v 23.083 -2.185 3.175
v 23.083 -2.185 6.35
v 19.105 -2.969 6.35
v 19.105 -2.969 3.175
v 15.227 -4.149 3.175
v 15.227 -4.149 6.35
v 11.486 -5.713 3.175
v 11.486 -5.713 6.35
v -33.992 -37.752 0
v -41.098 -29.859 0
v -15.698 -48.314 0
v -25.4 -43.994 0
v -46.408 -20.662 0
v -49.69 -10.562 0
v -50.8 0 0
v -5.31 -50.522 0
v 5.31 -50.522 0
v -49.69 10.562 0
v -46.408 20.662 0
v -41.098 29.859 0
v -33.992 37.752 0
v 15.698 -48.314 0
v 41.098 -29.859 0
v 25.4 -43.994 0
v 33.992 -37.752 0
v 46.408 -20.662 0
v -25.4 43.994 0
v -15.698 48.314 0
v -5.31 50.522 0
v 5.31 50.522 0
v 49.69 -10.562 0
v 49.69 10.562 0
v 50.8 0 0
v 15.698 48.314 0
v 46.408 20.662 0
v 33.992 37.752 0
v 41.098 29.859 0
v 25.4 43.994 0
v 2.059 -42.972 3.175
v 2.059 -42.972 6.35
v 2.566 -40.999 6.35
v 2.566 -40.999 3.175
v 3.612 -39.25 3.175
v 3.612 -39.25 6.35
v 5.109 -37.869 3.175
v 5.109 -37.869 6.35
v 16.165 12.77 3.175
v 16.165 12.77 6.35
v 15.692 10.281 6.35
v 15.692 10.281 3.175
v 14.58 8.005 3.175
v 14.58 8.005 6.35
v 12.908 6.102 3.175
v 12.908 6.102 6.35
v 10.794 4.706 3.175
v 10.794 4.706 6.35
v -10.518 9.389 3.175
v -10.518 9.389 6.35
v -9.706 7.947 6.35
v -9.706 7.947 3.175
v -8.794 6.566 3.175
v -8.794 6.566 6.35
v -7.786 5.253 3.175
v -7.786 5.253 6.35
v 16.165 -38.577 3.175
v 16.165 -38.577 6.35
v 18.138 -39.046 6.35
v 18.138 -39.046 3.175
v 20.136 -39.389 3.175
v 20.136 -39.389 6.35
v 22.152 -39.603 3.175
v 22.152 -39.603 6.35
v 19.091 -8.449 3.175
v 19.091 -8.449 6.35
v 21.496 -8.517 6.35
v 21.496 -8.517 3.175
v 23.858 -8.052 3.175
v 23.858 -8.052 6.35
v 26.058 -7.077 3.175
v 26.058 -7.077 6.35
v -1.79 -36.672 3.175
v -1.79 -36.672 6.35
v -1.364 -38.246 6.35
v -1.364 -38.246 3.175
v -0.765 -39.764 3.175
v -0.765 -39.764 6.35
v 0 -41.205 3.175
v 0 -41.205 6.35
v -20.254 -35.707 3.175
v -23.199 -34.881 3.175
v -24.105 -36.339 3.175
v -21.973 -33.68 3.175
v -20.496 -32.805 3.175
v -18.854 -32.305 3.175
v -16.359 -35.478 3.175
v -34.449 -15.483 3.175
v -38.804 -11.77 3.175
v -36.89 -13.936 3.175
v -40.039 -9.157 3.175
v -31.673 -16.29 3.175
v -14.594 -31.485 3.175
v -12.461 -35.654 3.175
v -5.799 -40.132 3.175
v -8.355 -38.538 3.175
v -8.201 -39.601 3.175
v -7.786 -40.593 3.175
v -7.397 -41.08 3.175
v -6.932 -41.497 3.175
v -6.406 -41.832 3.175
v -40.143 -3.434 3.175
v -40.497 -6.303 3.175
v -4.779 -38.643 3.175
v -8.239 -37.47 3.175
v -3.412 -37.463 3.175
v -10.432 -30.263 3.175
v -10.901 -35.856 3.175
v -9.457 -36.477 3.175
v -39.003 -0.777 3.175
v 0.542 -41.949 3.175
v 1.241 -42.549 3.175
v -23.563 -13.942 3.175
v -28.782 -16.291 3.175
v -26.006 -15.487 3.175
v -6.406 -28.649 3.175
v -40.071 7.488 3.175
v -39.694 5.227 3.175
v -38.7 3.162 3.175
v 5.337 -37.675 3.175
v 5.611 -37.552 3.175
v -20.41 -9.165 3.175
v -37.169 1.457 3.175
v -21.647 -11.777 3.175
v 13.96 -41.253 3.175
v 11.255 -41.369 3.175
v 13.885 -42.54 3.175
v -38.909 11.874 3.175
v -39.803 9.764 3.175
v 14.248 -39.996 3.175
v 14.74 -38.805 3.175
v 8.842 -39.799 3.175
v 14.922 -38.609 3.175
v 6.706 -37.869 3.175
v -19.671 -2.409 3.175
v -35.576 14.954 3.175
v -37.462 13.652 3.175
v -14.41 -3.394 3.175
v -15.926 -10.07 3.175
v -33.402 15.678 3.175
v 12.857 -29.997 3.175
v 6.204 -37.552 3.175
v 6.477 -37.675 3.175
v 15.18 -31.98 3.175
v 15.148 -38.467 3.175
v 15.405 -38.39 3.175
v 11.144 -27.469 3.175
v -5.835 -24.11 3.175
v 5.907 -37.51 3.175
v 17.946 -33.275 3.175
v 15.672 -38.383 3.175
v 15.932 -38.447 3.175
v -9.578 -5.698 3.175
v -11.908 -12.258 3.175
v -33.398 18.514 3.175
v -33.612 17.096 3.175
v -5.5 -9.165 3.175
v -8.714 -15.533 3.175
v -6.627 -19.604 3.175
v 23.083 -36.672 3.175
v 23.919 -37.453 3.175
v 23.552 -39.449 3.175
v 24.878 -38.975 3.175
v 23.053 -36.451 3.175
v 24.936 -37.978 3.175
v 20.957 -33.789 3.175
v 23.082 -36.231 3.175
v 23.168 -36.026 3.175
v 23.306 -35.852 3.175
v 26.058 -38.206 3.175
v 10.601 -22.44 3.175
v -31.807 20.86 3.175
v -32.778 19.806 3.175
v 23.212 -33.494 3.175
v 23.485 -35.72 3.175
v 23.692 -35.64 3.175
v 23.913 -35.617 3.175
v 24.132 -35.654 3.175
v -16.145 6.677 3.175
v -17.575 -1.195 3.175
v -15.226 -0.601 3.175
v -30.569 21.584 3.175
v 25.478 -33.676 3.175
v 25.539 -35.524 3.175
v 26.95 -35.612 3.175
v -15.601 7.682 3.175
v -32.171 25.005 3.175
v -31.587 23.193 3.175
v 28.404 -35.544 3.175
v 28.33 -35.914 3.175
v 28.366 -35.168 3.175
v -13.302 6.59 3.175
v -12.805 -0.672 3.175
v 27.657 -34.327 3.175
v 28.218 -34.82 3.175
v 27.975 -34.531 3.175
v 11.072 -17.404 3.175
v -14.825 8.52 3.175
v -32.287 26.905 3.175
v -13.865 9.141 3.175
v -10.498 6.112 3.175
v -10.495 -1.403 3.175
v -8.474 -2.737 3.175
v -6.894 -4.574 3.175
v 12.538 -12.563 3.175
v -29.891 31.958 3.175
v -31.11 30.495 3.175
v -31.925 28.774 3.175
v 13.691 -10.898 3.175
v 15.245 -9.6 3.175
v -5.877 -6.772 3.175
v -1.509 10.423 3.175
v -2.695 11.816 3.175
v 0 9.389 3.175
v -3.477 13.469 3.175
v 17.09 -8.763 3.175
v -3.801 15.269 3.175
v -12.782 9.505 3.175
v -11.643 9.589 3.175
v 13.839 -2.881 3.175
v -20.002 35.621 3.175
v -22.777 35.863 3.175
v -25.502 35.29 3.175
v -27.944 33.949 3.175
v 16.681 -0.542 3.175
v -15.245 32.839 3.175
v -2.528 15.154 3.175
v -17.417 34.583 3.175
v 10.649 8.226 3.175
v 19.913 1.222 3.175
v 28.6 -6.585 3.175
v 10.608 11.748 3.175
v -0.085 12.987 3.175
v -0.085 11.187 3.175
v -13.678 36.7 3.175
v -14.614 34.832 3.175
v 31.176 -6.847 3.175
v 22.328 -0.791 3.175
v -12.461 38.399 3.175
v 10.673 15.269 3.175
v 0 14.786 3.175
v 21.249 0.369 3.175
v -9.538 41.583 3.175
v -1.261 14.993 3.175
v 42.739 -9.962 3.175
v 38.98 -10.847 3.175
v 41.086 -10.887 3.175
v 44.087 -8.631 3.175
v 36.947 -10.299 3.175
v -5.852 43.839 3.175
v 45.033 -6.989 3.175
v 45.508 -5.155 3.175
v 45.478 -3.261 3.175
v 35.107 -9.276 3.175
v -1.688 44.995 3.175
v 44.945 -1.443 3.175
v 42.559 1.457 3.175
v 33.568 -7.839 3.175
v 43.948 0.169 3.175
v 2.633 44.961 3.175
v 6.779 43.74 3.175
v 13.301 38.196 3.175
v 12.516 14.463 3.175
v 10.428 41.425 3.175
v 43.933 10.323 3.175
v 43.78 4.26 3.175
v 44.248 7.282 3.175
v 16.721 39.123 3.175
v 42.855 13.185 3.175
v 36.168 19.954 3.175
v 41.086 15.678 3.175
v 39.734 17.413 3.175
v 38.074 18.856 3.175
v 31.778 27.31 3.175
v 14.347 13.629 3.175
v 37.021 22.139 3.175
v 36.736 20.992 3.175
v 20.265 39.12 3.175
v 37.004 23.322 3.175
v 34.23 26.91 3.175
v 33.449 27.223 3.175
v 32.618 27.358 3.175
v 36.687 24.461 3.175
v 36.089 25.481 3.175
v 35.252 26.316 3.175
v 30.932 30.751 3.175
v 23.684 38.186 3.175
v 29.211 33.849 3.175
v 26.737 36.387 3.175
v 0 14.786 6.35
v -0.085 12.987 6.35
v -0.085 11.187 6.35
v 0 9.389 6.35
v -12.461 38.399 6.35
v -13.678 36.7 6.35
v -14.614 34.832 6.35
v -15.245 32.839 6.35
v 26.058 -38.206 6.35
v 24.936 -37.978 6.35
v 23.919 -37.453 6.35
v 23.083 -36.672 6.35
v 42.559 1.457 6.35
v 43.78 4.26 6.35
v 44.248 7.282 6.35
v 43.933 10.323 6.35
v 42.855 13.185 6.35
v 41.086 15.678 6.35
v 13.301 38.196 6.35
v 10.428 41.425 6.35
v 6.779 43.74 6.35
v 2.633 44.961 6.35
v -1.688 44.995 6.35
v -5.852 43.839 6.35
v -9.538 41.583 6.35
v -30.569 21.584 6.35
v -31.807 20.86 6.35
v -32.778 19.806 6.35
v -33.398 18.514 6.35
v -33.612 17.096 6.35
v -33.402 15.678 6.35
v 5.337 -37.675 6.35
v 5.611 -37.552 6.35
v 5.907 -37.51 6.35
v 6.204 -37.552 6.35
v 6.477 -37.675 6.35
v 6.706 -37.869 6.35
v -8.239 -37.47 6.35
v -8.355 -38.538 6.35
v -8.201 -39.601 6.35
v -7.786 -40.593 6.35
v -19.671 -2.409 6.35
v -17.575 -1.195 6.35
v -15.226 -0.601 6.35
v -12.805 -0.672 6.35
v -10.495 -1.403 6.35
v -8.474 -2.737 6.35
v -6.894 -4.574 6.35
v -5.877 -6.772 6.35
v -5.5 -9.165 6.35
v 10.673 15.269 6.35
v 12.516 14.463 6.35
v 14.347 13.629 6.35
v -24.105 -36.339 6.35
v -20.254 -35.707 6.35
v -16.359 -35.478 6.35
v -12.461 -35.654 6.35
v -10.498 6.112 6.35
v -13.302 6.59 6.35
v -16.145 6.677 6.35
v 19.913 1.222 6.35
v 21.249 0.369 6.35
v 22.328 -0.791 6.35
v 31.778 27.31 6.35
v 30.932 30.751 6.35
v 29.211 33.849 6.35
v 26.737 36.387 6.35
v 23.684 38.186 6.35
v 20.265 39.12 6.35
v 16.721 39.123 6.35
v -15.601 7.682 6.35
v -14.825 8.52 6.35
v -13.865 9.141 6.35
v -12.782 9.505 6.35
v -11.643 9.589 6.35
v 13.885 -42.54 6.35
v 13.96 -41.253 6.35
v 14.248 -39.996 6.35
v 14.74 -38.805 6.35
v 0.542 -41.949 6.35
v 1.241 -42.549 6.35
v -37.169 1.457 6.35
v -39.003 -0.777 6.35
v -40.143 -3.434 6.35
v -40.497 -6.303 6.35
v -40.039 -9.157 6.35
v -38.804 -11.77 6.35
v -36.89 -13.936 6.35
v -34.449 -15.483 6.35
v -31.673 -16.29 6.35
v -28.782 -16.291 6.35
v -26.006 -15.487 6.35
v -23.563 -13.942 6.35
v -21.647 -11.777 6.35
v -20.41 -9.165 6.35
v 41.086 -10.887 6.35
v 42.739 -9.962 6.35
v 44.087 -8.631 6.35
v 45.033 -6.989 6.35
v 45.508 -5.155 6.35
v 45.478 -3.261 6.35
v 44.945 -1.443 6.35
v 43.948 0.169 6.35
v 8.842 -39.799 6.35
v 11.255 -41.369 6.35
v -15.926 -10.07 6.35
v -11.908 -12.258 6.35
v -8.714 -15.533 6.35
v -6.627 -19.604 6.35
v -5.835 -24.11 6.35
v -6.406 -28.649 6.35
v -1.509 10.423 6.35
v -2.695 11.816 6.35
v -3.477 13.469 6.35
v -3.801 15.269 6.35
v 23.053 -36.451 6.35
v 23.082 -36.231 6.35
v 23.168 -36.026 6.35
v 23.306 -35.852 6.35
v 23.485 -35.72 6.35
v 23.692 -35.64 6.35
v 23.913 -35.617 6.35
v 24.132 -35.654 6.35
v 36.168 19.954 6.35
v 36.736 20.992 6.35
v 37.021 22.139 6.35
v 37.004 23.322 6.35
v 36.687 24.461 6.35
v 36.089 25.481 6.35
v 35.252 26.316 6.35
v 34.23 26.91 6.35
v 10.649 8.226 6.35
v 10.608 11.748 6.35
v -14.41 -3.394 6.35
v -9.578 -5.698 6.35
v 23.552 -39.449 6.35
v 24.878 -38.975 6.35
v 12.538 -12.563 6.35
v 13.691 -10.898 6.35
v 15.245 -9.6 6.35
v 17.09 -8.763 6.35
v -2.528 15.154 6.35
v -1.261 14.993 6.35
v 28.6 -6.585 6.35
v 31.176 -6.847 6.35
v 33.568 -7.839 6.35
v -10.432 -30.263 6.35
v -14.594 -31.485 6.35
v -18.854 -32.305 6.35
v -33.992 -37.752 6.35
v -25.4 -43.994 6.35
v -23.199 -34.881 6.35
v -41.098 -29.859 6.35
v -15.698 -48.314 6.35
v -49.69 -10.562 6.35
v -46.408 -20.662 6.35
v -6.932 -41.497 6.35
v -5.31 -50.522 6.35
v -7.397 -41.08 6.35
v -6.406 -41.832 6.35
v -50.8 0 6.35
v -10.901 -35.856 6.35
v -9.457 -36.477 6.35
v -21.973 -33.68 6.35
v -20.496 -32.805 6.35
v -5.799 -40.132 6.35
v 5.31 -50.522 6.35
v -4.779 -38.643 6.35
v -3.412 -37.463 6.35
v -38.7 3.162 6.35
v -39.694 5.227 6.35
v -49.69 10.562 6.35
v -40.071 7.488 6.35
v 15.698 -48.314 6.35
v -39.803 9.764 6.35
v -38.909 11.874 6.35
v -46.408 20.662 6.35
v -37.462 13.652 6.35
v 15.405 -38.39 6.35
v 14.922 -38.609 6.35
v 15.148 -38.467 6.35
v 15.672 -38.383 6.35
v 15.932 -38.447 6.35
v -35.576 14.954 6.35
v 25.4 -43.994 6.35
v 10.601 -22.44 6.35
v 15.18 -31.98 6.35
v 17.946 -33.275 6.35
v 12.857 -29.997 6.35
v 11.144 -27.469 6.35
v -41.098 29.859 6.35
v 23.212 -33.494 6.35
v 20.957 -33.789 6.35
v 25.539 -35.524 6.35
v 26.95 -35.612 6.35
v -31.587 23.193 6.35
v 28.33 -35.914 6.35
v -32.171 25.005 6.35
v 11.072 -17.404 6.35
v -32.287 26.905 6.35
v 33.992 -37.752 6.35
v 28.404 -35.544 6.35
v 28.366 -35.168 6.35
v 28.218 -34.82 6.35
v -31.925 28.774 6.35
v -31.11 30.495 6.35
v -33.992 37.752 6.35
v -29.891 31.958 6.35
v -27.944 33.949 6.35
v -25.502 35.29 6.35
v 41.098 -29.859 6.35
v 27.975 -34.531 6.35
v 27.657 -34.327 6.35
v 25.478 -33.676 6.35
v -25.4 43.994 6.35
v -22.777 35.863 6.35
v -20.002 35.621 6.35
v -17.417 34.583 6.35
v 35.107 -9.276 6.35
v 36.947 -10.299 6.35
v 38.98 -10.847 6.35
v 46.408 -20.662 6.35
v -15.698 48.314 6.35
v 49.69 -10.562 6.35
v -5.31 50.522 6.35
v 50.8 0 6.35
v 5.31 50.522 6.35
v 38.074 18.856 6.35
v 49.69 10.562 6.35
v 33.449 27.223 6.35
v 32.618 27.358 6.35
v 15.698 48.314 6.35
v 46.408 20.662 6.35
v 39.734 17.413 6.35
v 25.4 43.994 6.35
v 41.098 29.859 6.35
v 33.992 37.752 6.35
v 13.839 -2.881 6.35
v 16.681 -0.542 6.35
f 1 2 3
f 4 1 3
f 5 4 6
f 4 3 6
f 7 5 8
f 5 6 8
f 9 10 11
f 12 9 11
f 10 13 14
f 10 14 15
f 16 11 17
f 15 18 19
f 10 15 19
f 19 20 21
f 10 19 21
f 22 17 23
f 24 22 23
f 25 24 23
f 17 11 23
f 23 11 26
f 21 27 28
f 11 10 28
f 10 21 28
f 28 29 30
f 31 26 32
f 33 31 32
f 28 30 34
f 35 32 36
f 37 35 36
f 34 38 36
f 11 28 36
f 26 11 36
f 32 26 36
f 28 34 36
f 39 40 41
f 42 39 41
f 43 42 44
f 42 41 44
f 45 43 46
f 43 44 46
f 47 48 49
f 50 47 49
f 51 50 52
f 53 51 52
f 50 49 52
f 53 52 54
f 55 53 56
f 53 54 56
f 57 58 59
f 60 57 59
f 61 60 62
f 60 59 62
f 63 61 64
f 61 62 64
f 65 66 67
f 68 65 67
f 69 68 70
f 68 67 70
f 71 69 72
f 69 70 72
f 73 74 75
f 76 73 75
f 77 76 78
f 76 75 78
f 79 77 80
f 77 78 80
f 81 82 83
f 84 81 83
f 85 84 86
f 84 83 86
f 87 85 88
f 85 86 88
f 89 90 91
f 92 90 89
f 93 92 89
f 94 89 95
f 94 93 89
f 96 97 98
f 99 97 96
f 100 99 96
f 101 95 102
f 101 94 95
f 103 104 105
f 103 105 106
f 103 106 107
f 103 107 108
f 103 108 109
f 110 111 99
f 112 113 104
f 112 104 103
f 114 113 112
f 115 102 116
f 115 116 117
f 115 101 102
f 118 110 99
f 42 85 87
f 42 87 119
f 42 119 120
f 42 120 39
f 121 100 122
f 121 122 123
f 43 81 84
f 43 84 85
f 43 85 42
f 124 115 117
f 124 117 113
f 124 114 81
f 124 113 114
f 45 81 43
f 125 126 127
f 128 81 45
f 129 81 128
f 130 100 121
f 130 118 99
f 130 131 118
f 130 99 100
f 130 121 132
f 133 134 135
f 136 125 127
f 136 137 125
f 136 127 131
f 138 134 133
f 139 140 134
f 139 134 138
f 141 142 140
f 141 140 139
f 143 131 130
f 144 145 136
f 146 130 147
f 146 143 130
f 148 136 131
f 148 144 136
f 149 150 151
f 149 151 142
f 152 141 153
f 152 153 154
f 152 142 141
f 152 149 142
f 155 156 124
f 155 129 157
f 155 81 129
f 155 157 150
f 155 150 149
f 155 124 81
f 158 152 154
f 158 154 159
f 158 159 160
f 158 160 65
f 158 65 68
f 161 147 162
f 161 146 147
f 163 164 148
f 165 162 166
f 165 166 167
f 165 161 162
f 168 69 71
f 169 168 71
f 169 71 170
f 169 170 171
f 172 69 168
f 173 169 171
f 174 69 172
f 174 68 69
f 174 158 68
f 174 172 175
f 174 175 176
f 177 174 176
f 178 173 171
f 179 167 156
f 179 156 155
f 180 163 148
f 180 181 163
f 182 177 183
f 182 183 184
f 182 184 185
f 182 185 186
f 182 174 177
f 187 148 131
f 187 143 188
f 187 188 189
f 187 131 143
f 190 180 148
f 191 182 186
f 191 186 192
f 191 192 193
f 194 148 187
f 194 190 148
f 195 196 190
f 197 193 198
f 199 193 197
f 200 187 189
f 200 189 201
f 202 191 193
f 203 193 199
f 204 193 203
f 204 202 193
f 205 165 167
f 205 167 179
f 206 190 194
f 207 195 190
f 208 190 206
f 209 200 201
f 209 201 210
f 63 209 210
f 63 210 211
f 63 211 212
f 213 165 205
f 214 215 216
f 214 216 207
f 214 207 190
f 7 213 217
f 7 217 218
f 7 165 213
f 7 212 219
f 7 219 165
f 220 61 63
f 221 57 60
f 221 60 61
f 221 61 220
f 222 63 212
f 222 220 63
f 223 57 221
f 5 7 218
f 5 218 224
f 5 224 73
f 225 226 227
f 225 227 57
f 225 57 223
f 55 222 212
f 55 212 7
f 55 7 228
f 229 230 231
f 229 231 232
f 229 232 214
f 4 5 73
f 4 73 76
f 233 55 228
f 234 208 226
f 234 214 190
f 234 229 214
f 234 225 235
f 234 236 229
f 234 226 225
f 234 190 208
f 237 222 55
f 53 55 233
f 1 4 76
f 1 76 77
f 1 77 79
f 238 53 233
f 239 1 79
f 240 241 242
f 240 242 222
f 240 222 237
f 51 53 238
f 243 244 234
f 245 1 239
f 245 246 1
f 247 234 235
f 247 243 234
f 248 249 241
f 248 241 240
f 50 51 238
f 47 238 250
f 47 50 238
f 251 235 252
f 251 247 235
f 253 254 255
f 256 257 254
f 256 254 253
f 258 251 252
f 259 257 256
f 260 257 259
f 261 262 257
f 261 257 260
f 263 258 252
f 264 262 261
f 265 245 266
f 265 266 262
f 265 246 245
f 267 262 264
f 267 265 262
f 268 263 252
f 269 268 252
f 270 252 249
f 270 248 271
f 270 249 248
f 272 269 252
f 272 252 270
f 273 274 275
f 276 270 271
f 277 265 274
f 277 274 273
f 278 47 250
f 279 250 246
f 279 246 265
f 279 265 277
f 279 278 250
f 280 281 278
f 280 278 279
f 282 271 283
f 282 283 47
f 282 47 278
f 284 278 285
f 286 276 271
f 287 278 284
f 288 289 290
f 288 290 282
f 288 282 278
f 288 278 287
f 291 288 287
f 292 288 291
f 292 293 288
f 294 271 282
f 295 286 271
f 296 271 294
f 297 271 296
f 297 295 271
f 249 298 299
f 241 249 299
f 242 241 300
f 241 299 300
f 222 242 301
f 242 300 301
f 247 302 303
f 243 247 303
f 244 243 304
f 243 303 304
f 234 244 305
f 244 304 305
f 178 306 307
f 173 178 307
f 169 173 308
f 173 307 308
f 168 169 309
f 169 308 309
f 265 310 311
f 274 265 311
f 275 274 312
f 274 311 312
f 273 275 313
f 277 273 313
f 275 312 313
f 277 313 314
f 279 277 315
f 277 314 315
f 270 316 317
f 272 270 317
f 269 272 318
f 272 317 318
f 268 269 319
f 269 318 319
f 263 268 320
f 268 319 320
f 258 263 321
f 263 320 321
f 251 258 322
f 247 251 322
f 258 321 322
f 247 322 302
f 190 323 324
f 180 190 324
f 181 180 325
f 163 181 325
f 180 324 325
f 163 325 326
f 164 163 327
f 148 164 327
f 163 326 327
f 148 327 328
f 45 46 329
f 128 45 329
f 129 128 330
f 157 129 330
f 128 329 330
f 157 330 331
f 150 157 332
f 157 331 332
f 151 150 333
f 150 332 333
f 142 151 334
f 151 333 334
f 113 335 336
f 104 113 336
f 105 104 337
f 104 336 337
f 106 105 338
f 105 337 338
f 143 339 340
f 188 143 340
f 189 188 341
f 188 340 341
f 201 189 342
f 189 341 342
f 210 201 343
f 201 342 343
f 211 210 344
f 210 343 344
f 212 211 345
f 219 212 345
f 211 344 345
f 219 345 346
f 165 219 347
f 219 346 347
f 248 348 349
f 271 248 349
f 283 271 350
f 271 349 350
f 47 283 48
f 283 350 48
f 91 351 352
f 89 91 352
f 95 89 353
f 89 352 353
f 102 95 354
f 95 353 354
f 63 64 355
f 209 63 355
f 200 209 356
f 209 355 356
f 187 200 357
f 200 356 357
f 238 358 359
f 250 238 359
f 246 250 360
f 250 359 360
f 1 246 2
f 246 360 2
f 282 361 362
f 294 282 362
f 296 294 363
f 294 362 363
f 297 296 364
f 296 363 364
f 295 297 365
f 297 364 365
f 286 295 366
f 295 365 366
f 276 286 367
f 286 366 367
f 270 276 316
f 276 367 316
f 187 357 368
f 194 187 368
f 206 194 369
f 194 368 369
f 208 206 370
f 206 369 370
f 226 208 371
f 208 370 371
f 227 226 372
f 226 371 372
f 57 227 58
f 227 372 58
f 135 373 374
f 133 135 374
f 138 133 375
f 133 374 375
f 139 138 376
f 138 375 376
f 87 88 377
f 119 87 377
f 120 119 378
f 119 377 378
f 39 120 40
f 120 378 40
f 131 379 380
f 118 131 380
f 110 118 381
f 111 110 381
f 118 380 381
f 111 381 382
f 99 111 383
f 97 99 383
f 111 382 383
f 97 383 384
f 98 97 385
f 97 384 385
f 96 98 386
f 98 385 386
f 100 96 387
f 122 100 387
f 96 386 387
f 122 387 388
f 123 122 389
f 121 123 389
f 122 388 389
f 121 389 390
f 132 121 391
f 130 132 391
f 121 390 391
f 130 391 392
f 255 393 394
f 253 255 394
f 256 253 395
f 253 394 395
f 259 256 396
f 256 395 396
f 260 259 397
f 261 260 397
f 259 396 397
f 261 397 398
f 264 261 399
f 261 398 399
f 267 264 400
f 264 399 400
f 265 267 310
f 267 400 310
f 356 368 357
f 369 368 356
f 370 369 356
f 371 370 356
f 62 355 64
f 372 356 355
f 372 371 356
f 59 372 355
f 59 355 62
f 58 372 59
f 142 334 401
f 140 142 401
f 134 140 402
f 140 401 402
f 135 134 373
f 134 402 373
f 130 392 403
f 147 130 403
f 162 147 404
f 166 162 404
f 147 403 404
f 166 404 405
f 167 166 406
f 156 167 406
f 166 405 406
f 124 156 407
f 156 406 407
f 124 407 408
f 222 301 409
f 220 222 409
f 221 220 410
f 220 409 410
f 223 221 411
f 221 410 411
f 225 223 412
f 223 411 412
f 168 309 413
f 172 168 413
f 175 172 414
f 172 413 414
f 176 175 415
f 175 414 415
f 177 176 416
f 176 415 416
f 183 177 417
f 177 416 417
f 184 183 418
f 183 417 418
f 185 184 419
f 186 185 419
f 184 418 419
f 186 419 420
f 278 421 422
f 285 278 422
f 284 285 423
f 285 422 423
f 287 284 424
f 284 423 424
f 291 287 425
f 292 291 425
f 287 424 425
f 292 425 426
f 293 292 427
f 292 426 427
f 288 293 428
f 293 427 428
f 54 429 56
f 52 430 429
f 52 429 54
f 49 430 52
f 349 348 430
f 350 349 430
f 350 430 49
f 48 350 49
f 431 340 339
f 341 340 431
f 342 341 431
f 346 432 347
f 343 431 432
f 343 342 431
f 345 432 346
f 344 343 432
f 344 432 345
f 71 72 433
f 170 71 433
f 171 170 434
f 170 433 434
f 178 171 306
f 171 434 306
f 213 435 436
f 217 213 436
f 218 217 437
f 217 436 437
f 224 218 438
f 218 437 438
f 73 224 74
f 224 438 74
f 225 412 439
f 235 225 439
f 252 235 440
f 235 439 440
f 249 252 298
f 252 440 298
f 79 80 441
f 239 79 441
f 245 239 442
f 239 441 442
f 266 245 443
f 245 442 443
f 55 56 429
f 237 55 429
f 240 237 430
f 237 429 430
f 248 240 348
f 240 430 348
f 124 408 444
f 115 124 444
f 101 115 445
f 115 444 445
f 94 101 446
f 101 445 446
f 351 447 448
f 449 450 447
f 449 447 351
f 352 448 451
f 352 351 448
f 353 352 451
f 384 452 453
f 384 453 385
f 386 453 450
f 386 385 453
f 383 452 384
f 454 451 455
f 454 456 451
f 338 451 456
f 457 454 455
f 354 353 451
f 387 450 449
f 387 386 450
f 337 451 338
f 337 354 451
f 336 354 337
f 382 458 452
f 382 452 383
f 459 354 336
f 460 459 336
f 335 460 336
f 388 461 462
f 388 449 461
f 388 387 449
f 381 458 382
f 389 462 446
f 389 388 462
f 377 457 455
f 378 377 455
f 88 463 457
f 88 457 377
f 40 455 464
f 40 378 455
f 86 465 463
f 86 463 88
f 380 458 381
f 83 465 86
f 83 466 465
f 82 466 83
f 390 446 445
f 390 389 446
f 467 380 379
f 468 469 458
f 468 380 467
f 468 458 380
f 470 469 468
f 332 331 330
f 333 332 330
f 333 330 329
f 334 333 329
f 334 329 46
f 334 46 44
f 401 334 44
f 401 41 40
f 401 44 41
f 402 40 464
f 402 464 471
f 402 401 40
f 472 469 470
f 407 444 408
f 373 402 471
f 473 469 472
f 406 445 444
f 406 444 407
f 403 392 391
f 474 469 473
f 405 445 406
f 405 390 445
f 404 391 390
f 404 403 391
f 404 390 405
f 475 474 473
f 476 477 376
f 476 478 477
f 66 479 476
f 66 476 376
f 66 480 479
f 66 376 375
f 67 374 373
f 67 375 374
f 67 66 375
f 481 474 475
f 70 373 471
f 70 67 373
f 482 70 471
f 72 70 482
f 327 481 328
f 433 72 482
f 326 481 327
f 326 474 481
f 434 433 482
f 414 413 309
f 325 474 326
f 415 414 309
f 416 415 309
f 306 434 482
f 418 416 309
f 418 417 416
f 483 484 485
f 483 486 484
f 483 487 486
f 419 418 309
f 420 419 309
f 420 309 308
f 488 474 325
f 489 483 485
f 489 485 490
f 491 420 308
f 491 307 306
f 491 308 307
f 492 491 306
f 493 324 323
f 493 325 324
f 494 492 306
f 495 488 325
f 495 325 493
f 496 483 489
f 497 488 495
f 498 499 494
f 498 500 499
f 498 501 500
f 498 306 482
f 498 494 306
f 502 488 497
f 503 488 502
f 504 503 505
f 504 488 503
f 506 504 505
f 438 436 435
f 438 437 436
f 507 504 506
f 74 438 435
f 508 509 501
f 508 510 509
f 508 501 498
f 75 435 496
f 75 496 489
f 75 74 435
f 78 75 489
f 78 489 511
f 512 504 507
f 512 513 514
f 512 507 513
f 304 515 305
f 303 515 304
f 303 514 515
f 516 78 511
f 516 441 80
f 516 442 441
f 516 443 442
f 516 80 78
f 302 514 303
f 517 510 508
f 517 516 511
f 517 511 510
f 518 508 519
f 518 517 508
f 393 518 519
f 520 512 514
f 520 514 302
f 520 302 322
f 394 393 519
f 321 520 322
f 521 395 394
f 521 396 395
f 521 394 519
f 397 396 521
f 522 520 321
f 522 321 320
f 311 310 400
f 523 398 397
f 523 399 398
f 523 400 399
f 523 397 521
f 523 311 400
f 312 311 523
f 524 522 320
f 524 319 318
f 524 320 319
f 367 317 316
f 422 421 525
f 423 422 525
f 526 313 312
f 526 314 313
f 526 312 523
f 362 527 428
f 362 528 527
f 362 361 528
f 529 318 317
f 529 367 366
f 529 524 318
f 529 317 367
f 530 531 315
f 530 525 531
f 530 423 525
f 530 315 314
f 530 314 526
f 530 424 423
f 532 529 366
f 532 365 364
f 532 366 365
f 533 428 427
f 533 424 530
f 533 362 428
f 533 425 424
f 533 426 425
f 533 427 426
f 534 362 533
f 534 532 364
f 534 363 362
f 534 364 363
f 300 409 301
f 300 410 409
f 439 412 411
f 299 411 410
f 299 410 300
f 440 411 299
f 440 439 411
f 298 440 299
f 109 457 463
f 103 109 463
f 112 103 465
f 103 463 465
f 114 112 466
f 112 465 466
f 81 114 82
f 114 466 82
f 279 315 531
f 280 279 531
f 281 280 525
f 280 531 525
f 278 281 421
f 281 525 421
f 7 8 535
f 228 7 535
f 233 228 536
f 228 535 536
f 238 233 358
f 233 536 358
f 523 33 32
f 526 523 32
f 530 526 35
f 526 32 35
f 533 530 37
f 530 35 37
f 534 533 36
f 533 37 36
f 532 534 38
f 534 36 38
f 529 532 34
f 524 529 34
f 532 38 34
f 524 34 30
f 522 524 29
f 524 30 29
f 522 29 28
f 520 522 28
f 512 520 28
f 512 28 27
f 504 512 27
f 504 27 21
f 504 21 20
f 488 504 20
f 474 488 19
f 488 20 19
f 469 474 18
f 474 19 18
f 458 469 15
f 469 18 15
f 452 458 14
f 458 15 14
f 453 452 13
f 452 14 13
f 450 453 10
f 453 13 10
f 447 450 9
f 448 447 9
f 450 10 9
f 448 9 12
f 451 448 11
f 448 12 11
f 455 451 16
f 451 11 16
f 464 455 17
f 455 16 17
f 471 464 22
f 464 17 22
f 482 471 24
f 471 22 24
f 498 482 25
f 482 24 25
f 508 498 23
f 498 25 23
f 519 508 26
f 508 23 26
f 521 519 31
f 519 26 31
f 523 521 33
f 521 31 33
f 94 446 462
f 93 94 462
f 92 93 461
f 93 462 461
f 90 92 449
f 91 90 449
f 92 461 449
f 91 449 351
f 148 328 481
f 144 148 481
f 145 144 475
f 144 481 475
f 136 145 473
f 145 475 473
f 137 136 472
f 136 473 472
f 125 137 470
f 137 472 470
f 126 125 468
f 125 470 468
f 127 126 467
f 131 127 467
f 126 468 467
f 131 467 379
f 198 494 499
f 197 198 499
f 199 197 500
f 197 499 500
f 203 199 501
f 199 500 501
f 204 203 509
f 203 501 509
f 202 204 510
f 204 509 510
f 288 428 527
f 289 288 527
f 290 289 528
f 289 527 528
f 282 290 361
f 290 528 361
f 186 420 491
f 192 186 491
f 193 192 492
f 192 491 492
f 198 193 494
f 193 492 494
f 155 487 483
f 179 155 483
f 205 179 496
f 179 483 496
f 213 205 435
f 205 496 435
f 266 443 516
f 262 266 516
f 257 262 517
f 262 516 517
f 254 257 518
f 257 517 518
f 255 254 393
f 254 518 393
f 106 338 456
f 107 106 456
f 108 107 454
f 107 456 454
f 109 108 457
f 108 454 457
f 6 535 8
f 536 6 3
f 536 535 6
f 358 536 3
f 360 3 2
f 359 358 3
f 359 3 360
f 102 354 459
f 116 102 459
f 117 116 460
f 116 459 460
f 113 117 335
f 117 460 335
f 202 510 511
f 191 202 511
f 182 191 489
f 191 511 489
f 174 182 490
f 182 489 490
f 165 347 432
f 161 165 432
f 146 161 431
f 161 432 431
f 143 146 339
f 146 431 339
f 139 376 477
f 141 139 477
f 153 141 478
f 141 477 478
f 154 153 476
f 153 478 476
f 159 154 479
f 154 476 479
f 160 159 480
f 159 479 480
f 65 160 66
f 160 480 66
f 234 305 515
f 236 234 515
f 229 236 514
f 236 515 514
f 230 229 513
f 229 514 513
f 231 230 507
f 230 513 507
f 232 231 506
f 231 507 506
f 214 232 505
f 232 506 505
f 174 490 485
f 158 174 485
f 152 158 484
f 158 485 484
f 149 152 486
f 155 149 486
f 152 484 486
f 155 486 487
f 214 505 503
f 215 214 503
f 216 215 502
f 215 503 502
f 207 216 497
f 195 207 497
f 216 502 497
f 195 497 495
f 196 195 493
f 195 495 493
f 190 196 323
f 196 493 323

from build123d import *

# Parameters (mm, degrees)
F0_R     = 50.8
F1_DEPTH = 6.35
F3_DEPTH = 3.175


with BuildPart() as f1:
    # F0 (on Top) → F1 (new body)
    with BuildSketch(Plane.XY):
        Circle(F0_R)
    extrude(amount=F1_DEPTH)

    # F2 (on face) → F3 (cut)
    with BuildSketch(Plane.XY.offset(6.35)):
        with BuildLine():
            ThreePointArc((-20.409899, -9.165186), (-8.713511, -15.533016), (-6.405892, -28.649023))
            ThreePointArc((-6.405892, -28.649023), (-12.498571, -30.92391), (-18.853704, -32.30527))
            ThreePointArc((-18.853704, -32.30527), (-21.972675, -33.680035), (-24.105206, -36.339033))
            ThreePointArc((-24.105206, -36.339033), (-18.309615, -35.54218), (-12.460569, -35.654053))
            ThreePointArc((-12.460569, -35.654053), (-10.157818, -36.115918), (-8.238821, -37.469961))
            ThreePointArc((-8.238821, -37.469961), (-8.312029, -39.074644), (-7.786276, -40.592521))
            ThreePointArc((-7.786276, -40.592521), (-7.173062, -41.29787), (-6.405892, -41.831724))
            ThreePointArc((-6.405892, -41.831724), (-4.778592, -38.642786), (-1.789923, -36.671672))
            ThreePointArc((-1.789923, -36.671672), (-1.085393, -39.0133), (0, -41.204534))
            ThreePointArc((0, -41.204534), (0.873752, -42.269552), (2.058734, -42.972066))
            ThreePointArc((2.058734, -42.972066), (3.026163, -40.087128), (5.10915, -37.869032))
            ThreePointArc((5.10915, -37.869032), (5.90739, -37.51004), (6.70563, -37.869032))
            ThreePointArc((6.70563, -37.869032), (10.017439, -40.631321), (13.8848, -42.539682))
            ThreePointArc((13.8848, -42.539682), (14.078165, -40.618723), (14.740057, -38.80506))
            ThreePointArc((14.740057, -38.80506), (15.40462, -38.390072), (16.165486, -38.577001))
            ThreePointArc((16.165486, -38.577001), (19.134333, -39.233369), (22.152284, -39.6033))
            ThreePointArc((22.152284, -39.6033), (24.22883, -39.250722), (26.057957, -38.20638))
            ThreePointArc((26.057957, -38.20638), (24.409477, -37.750926), (23.082776, -36.671672))
            ThreePointArc((23.082776, -36.671672), (23.305789, -35.851729), (24.132207, -35.654053))
            ThreePointArc((24.132207, -35.654053), (26.246167, -35.540671), (28.329933, -35.914309))
            ThreePointArc((28.329933, -35.914309), (28.305036, -34.988535), (27.65722, -34.32671))
            ThreePointArc((27.65722, -34.32671), (24.34987, -33.525294), (20.957004, -33.788539))
            ThreePointArc((20.957004, -33.788539), (15.180236, -31.980008), (11.14397, -27.468866))
            ThreePointArc((11.14397, -27.468866), (10.709627, -19.910276), (12.538101, -12.56333))
            ThreePointArc((12.538101, -12.56333), (15.245467, -9.599875), (19.090848, -8.448814))
            ThreePointArc((19.090848, -8.448814), (22.690074, -8.35066), (26.057957, -7.077309))
            ThreePointArc((26.057957, -7.077309), (29.897773, -6.621777), (33.567846, -7.839257))
            ThreePointArc((33.567846, -7.839257), (36.947302, -10.299215), (41.085728, -10.887046))
            ThreePointArc((41.085728, -10.887046), (45.507777, -5.155106), (42.558827, 1.456501))
            ThreePointArc((42.558827, 1.456501), (44.188538, 8.812407), (41.085728, 15.67811))
            ThreePointArc((41.085728, 15.67811), (38.938533, 18.174445), (36.168348, 19.954393))
            ThreePointArc((36.168348, 19.954393), (36.881996, 23.901454), (34.229763, 26.910482))
            ThreePointArc((34.229763, 26.910482), (33.036992, 27.313356), (31.778026, 27.309604))
            ThreePointArc((31.778026, 27.309604), (25.270382, 37.388286), (13.300548, 38.19596))
            ThreePointArc((13.300548, 38.19596), (0.47393, 45.12883), (-12.460569, 38.399376))
            ThreePointArc((-12.460569, 38.399376), (-14.182386, 35.784343), (-15.245431, 32.83935))
            ThreePointArc((-15.245431, 32.83935), (-22.776904, 35.86315), (-29.891349, 31.957883))
            ThreePointArc((-29.891349, 31.957883), (-32.28661, 26.905181), (-30.569399, 21.583691))
            ThreePointArc((-30.569399, 21.583691), (-33.136528, 19.1829), (-33.401847, 15.67811))
            ThreePointArc((-33.401847, 15.67811), (-39.802605, 9.763866), (-37.169039, 1.456501))
            ThreePointArc((-37.169039, 1.456501), (-35.724093, -14.795951), (-20.409899, -9.165186))
        make_face()
        with BuildLine():
            ThreePointArc((-19.671235, -2.408931), (-10.495474, -1.403019), (-5.499953, -9.165186))
            ThreePointArc((-5.499953, -9.165186), (-11.918937, -4.388742), (-19.671235, -2.408931))
        make_face(mode=Mode.SUBTRACT)
        with BuildLine():
            ThreePointArc((11.486482, -5.712907), (15.204523, -1.644017), (19.912776, 1.221651))
            ThreePointArc((19.912776, 1.221651), (21.825364, -0.176932), (23.082776, -2.185152))
            ThreePointArc((23.082776, -2.185152), (17.151026, -3.509855), (11.486482, -5.712907))
        make_face(mode=Mode.SUBTRACT)
        with BuildLine():
            ThreePointArc((-10.517537, 9.38917), (-9.26208, 7.248359), (-7.786276, 5.253054))
            ThreePointArc((-7.786276, 5.253054), (-11.891821, 6.399429), (-16.145367, 6.676962))
            ThreePointArc((-16.145367, 6.676962), (-13.865306, 9.140813), (-10.517537, 9.38917))
        make_face(mode=Mode.SUBTRACT)
        with BuildLine():
            ThreePointArc((0, 9.38917), (-2.69509, 11.815598), (-3.800875, 15.269336))
            ThreePointArc((-3.800875, 15.269336), (-1.893817, 15.079444), (0, 14.78553))
            ThreePointArc((0, 14.78553), (-0.095241, 12.08735), (0, 9.38917))
        make_face(mode=Mode.SUBTRACT)
        with BuildLine():
            ThreePointArc((10.79395, 4.70623), (10.615223, 9.986429), (10.673, 15.269336))
            ThreePointArc((10.673, 15.269336), (13.432832, 14.049362), (16.165486, 12.769669))
            ThreePointArc((16.165486, 12.769669), (14.580089, 8.004927), (10.79395, 4.70623))
        make_face(mode=Mode.SUBTRACT)
    extrude(amount=-F3_DEPTH, mode=Mode.SUBTRACT)


solid = f1.part
